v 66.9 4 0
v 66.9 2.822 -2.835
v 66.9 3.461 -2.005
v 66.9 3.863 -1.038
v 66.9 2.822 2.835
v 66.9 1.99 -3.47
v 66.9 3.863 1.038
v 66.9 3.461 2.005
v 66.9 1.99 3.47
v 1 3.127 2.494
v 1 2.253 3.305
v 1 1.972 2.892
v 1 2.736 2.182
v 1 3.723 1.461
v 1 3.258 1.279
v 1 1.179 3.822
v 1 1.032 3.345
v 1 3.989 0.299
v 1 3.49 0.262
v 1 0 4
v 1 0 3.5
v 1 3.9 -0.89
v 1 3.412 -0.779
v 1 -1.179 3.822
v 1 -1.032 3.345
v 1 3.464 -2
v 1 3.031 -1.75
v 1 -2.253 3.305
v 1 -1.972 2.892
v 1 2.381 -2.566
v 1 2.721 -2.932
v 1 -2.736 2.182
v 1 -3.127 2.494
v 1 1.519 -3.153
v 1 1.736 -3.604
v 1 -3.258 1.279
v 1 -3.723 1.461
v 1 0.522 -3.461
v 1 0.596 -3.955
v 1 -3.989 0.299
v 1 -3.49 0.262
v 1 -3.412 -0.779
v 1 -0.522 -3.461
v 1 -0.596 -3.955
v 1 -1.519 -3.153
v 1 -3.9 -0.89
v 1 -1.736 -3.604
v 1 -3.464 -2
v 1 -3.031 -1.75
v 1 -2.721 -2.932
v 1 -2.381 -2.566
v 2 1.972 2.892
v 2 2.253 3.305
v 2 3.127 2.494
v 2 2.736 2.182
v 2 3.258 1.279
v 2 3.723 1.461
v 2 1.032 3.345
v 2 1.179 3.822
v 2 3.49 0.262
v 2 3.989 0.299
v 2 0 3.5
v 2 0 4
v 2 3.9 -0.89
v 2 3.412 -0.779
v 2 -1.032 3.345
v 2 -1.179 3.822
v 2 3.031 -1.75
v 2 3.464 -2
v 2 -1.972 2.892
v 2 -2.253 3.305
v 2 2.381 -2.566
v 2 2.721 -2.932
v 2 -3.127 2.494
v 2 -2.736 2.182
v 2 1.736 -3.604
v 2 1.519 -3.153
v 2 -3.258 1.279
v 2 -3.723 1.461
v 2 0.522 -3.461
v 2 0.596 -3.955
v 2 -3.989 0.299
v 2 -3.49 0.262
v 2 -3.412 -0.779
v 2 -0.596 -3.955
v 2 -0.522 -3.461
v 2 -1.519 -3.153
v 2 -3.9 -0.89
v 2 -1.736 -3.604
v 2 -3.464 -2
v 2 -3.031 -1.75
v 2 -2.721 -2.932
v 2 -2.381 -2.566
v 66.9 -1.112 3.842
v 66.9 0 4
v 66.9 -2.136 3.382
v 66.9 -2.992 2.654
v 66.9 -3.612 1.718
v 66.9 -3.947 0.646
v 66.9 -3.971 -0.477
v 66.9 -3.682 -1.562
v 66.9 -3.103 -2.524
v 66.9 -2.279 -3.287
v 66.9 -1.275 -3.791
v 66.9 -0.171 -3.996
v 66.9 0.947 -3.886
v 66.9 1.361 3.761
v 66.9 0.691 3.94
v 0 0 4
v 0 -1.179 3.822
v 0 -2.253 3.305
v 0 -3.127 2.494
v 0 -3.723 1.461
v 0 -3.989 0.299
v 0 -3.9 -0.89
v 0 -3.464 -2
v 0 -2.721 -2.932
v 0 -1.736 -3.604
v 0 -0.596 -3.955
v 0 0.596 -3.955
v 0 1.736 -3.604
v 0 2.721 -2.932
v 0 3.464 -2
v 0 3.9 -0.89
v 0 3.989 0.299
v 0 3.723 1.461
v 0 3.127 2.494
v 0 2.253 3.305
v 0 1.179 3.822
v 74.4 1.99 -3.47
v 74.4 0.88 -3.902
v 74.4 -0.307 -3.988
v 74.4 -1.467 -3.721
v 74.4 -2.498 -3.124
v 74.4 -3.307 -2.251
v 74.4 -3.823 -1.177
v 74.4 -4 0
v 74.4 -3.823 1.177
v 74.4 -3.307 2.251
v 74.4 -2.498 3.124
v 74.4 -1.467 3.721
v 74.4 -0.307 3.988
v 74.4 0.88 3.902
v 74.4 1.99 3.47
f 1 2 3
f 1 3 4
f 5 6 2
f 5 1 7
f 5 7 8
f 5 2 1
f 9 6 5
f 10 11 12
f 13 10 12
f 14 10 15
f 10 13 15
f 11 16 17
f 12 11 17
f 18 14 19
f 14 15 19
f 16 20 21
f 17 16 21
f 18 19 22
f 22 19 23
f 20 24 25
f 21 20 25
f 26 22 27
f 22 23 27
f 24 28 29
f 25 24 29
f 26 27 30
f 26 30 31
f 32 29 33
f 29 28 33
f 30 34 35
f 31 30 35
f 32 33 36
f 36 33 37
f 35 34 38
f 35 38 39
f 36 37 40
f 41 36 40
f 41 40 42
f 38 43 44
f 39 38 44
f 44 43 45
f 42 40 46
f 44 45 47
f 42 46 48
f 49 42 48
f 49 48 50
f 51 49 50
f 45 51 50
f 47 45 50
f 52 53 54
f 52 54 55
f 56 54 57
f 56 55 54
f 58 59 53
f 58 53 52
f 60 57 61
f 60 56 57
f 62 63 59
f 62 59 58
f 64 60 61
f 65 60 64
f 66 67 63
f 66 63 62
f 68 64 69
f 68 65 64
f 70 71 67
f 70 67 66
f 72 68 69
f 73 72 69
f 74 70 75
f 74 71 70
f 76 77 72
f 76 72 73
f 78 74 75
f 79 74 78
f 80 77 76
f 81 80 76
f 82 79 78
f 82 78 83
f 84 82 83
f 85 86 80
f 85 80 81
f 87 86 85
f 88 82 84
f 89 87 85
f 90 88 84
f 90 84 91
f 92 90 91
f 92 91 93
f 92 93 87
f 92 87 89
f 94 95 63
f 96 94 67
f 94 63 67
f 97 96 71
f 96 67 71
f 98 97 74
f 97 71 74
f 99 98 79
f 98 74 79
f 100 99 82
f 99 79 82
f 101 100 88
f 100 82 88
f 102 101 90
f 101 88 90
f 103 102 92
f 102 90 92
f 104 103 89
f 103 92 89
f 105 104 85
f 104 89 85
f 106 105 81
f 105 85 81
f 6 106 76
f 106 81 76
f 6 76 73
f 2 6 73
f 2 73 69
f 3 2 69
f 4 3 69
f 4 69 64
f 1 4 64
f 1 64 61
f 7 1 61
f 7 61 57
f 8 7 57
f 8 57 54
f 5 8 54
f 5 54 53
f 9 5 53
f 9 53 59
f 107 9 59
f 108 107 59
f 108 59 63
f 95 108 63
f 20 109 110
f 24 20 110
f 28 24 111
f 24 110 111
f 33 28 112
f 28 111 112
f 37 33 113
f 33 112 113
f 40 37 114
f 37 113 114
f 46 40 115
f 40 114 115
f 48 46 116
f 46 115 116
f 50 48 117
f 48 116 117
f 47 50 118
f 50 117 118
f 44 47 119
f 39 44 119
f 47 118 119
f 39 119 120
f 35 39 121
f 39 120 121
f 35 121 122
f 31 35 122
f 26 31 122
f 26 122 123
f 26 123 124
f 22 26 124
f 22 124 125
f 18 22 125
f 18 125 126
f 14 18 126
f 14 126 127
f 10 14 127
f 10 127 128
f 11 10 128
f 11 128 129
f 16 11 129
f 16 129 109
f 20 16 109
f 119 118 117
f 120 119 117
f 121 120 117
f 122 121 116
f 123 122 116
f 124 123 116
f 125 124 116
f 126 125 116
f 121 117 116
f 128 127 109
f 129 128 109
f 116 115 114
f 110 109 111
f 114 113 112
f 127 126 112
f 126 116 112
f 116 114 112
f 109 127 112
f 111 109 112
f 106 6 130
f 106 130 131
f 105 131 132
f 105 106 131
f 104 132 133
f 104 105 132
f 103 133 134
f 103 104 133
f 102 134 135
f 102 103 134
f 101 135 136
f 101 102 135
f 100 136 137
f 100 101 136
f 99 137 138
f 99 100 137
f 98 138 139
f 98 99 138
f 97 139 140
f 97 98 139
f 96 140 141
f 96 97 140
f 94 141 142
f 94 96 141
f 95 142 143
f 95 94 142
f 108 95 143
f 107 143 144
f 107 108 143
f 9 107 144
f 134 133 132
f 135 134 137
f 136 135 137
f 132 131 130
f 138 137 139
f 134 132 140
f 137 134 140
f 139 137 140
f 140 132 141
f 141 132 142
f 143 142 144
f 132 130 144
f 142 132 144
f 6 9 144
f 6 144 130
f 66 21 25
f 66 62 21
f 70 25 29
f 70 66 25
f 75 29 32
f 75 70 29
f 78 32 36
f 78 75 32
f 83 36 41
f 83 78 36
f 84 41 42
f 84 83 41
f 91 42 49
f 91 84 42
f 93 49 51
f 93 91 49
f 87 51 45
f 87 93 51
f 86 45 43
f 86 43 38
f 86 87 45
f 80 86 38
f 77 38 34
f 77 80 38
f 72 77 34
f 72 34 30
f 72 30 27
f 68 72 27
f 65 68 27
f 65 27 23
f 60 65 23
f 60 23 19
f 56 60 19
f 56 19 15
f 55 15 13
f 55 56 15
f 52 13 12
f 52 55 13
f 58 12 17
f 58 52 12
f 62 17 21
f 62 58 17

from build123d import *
from build123d.topology import SkipClean

# Parameters (mm, degrees)
SKETCH2_R           = 4
BOSS_EXTRUDE1_DEPTH = 66.9
BOSS_EXTRUDE2_DEPTH = 7.5
SKETCH4_W           = 1
SKETCH4_H           = 0.5


with BuildPart() as part:
    # Sketch2 → Boss-Extrude1 (new body)
    with BuildSketch(Plane(origin=(0, 0, 0), x_dir=(0, 0, -1), z_dir=(1, 0, 0))):
        with Locations(Location((0, 0, 0), (0, 0, 180))):
            Circle(SKETCH2_R)
    extrude(amount=BOSS_EXTRUDE1_DEPTH)

    # Sketch3 → Boss-Extrude2 (add)
    with SkipClean():  # the faces are left unmerged after this step: merging them gives an invalid solid
        with BuildSketch(Plane(origin=(66.9, 0, 0), x_dir=(0, 0, -1), z_dir=(1, 0, 0))):
            with BuildLine():
                Line((-3.469855905, 1.99), (3.469855905, 1.99))
                ThreePointArc((3.469855905, 1.99), (0, -4), (-3.469855905, 1.99))
            make_face()
        extrude(amount=BOSS_EXTRUDE2_DEPTH)

    # Sketch4 → Cut-Revolve1 (revolve, cut)
    with SkipClean():  # the faces are left unmerged after this step: merging them gives an invalid solid
        with BuildSketch(Plane.XY, mode=Mode.PRIVATE) as cut_revolve1_sk:
            with Locations((1.5, 3.75)):
                Rectangle(SKETCH4_W, SKETCH4_H)
        revolve(cut_revolve1_sk.sketch.rotate(Axis((0, 0, 0), (1, 0, 0)), 90), axis=Axis((0, 0, 0), (1, 0, 0)), mode=Mode.SUBTRACT)


solid = part.part
